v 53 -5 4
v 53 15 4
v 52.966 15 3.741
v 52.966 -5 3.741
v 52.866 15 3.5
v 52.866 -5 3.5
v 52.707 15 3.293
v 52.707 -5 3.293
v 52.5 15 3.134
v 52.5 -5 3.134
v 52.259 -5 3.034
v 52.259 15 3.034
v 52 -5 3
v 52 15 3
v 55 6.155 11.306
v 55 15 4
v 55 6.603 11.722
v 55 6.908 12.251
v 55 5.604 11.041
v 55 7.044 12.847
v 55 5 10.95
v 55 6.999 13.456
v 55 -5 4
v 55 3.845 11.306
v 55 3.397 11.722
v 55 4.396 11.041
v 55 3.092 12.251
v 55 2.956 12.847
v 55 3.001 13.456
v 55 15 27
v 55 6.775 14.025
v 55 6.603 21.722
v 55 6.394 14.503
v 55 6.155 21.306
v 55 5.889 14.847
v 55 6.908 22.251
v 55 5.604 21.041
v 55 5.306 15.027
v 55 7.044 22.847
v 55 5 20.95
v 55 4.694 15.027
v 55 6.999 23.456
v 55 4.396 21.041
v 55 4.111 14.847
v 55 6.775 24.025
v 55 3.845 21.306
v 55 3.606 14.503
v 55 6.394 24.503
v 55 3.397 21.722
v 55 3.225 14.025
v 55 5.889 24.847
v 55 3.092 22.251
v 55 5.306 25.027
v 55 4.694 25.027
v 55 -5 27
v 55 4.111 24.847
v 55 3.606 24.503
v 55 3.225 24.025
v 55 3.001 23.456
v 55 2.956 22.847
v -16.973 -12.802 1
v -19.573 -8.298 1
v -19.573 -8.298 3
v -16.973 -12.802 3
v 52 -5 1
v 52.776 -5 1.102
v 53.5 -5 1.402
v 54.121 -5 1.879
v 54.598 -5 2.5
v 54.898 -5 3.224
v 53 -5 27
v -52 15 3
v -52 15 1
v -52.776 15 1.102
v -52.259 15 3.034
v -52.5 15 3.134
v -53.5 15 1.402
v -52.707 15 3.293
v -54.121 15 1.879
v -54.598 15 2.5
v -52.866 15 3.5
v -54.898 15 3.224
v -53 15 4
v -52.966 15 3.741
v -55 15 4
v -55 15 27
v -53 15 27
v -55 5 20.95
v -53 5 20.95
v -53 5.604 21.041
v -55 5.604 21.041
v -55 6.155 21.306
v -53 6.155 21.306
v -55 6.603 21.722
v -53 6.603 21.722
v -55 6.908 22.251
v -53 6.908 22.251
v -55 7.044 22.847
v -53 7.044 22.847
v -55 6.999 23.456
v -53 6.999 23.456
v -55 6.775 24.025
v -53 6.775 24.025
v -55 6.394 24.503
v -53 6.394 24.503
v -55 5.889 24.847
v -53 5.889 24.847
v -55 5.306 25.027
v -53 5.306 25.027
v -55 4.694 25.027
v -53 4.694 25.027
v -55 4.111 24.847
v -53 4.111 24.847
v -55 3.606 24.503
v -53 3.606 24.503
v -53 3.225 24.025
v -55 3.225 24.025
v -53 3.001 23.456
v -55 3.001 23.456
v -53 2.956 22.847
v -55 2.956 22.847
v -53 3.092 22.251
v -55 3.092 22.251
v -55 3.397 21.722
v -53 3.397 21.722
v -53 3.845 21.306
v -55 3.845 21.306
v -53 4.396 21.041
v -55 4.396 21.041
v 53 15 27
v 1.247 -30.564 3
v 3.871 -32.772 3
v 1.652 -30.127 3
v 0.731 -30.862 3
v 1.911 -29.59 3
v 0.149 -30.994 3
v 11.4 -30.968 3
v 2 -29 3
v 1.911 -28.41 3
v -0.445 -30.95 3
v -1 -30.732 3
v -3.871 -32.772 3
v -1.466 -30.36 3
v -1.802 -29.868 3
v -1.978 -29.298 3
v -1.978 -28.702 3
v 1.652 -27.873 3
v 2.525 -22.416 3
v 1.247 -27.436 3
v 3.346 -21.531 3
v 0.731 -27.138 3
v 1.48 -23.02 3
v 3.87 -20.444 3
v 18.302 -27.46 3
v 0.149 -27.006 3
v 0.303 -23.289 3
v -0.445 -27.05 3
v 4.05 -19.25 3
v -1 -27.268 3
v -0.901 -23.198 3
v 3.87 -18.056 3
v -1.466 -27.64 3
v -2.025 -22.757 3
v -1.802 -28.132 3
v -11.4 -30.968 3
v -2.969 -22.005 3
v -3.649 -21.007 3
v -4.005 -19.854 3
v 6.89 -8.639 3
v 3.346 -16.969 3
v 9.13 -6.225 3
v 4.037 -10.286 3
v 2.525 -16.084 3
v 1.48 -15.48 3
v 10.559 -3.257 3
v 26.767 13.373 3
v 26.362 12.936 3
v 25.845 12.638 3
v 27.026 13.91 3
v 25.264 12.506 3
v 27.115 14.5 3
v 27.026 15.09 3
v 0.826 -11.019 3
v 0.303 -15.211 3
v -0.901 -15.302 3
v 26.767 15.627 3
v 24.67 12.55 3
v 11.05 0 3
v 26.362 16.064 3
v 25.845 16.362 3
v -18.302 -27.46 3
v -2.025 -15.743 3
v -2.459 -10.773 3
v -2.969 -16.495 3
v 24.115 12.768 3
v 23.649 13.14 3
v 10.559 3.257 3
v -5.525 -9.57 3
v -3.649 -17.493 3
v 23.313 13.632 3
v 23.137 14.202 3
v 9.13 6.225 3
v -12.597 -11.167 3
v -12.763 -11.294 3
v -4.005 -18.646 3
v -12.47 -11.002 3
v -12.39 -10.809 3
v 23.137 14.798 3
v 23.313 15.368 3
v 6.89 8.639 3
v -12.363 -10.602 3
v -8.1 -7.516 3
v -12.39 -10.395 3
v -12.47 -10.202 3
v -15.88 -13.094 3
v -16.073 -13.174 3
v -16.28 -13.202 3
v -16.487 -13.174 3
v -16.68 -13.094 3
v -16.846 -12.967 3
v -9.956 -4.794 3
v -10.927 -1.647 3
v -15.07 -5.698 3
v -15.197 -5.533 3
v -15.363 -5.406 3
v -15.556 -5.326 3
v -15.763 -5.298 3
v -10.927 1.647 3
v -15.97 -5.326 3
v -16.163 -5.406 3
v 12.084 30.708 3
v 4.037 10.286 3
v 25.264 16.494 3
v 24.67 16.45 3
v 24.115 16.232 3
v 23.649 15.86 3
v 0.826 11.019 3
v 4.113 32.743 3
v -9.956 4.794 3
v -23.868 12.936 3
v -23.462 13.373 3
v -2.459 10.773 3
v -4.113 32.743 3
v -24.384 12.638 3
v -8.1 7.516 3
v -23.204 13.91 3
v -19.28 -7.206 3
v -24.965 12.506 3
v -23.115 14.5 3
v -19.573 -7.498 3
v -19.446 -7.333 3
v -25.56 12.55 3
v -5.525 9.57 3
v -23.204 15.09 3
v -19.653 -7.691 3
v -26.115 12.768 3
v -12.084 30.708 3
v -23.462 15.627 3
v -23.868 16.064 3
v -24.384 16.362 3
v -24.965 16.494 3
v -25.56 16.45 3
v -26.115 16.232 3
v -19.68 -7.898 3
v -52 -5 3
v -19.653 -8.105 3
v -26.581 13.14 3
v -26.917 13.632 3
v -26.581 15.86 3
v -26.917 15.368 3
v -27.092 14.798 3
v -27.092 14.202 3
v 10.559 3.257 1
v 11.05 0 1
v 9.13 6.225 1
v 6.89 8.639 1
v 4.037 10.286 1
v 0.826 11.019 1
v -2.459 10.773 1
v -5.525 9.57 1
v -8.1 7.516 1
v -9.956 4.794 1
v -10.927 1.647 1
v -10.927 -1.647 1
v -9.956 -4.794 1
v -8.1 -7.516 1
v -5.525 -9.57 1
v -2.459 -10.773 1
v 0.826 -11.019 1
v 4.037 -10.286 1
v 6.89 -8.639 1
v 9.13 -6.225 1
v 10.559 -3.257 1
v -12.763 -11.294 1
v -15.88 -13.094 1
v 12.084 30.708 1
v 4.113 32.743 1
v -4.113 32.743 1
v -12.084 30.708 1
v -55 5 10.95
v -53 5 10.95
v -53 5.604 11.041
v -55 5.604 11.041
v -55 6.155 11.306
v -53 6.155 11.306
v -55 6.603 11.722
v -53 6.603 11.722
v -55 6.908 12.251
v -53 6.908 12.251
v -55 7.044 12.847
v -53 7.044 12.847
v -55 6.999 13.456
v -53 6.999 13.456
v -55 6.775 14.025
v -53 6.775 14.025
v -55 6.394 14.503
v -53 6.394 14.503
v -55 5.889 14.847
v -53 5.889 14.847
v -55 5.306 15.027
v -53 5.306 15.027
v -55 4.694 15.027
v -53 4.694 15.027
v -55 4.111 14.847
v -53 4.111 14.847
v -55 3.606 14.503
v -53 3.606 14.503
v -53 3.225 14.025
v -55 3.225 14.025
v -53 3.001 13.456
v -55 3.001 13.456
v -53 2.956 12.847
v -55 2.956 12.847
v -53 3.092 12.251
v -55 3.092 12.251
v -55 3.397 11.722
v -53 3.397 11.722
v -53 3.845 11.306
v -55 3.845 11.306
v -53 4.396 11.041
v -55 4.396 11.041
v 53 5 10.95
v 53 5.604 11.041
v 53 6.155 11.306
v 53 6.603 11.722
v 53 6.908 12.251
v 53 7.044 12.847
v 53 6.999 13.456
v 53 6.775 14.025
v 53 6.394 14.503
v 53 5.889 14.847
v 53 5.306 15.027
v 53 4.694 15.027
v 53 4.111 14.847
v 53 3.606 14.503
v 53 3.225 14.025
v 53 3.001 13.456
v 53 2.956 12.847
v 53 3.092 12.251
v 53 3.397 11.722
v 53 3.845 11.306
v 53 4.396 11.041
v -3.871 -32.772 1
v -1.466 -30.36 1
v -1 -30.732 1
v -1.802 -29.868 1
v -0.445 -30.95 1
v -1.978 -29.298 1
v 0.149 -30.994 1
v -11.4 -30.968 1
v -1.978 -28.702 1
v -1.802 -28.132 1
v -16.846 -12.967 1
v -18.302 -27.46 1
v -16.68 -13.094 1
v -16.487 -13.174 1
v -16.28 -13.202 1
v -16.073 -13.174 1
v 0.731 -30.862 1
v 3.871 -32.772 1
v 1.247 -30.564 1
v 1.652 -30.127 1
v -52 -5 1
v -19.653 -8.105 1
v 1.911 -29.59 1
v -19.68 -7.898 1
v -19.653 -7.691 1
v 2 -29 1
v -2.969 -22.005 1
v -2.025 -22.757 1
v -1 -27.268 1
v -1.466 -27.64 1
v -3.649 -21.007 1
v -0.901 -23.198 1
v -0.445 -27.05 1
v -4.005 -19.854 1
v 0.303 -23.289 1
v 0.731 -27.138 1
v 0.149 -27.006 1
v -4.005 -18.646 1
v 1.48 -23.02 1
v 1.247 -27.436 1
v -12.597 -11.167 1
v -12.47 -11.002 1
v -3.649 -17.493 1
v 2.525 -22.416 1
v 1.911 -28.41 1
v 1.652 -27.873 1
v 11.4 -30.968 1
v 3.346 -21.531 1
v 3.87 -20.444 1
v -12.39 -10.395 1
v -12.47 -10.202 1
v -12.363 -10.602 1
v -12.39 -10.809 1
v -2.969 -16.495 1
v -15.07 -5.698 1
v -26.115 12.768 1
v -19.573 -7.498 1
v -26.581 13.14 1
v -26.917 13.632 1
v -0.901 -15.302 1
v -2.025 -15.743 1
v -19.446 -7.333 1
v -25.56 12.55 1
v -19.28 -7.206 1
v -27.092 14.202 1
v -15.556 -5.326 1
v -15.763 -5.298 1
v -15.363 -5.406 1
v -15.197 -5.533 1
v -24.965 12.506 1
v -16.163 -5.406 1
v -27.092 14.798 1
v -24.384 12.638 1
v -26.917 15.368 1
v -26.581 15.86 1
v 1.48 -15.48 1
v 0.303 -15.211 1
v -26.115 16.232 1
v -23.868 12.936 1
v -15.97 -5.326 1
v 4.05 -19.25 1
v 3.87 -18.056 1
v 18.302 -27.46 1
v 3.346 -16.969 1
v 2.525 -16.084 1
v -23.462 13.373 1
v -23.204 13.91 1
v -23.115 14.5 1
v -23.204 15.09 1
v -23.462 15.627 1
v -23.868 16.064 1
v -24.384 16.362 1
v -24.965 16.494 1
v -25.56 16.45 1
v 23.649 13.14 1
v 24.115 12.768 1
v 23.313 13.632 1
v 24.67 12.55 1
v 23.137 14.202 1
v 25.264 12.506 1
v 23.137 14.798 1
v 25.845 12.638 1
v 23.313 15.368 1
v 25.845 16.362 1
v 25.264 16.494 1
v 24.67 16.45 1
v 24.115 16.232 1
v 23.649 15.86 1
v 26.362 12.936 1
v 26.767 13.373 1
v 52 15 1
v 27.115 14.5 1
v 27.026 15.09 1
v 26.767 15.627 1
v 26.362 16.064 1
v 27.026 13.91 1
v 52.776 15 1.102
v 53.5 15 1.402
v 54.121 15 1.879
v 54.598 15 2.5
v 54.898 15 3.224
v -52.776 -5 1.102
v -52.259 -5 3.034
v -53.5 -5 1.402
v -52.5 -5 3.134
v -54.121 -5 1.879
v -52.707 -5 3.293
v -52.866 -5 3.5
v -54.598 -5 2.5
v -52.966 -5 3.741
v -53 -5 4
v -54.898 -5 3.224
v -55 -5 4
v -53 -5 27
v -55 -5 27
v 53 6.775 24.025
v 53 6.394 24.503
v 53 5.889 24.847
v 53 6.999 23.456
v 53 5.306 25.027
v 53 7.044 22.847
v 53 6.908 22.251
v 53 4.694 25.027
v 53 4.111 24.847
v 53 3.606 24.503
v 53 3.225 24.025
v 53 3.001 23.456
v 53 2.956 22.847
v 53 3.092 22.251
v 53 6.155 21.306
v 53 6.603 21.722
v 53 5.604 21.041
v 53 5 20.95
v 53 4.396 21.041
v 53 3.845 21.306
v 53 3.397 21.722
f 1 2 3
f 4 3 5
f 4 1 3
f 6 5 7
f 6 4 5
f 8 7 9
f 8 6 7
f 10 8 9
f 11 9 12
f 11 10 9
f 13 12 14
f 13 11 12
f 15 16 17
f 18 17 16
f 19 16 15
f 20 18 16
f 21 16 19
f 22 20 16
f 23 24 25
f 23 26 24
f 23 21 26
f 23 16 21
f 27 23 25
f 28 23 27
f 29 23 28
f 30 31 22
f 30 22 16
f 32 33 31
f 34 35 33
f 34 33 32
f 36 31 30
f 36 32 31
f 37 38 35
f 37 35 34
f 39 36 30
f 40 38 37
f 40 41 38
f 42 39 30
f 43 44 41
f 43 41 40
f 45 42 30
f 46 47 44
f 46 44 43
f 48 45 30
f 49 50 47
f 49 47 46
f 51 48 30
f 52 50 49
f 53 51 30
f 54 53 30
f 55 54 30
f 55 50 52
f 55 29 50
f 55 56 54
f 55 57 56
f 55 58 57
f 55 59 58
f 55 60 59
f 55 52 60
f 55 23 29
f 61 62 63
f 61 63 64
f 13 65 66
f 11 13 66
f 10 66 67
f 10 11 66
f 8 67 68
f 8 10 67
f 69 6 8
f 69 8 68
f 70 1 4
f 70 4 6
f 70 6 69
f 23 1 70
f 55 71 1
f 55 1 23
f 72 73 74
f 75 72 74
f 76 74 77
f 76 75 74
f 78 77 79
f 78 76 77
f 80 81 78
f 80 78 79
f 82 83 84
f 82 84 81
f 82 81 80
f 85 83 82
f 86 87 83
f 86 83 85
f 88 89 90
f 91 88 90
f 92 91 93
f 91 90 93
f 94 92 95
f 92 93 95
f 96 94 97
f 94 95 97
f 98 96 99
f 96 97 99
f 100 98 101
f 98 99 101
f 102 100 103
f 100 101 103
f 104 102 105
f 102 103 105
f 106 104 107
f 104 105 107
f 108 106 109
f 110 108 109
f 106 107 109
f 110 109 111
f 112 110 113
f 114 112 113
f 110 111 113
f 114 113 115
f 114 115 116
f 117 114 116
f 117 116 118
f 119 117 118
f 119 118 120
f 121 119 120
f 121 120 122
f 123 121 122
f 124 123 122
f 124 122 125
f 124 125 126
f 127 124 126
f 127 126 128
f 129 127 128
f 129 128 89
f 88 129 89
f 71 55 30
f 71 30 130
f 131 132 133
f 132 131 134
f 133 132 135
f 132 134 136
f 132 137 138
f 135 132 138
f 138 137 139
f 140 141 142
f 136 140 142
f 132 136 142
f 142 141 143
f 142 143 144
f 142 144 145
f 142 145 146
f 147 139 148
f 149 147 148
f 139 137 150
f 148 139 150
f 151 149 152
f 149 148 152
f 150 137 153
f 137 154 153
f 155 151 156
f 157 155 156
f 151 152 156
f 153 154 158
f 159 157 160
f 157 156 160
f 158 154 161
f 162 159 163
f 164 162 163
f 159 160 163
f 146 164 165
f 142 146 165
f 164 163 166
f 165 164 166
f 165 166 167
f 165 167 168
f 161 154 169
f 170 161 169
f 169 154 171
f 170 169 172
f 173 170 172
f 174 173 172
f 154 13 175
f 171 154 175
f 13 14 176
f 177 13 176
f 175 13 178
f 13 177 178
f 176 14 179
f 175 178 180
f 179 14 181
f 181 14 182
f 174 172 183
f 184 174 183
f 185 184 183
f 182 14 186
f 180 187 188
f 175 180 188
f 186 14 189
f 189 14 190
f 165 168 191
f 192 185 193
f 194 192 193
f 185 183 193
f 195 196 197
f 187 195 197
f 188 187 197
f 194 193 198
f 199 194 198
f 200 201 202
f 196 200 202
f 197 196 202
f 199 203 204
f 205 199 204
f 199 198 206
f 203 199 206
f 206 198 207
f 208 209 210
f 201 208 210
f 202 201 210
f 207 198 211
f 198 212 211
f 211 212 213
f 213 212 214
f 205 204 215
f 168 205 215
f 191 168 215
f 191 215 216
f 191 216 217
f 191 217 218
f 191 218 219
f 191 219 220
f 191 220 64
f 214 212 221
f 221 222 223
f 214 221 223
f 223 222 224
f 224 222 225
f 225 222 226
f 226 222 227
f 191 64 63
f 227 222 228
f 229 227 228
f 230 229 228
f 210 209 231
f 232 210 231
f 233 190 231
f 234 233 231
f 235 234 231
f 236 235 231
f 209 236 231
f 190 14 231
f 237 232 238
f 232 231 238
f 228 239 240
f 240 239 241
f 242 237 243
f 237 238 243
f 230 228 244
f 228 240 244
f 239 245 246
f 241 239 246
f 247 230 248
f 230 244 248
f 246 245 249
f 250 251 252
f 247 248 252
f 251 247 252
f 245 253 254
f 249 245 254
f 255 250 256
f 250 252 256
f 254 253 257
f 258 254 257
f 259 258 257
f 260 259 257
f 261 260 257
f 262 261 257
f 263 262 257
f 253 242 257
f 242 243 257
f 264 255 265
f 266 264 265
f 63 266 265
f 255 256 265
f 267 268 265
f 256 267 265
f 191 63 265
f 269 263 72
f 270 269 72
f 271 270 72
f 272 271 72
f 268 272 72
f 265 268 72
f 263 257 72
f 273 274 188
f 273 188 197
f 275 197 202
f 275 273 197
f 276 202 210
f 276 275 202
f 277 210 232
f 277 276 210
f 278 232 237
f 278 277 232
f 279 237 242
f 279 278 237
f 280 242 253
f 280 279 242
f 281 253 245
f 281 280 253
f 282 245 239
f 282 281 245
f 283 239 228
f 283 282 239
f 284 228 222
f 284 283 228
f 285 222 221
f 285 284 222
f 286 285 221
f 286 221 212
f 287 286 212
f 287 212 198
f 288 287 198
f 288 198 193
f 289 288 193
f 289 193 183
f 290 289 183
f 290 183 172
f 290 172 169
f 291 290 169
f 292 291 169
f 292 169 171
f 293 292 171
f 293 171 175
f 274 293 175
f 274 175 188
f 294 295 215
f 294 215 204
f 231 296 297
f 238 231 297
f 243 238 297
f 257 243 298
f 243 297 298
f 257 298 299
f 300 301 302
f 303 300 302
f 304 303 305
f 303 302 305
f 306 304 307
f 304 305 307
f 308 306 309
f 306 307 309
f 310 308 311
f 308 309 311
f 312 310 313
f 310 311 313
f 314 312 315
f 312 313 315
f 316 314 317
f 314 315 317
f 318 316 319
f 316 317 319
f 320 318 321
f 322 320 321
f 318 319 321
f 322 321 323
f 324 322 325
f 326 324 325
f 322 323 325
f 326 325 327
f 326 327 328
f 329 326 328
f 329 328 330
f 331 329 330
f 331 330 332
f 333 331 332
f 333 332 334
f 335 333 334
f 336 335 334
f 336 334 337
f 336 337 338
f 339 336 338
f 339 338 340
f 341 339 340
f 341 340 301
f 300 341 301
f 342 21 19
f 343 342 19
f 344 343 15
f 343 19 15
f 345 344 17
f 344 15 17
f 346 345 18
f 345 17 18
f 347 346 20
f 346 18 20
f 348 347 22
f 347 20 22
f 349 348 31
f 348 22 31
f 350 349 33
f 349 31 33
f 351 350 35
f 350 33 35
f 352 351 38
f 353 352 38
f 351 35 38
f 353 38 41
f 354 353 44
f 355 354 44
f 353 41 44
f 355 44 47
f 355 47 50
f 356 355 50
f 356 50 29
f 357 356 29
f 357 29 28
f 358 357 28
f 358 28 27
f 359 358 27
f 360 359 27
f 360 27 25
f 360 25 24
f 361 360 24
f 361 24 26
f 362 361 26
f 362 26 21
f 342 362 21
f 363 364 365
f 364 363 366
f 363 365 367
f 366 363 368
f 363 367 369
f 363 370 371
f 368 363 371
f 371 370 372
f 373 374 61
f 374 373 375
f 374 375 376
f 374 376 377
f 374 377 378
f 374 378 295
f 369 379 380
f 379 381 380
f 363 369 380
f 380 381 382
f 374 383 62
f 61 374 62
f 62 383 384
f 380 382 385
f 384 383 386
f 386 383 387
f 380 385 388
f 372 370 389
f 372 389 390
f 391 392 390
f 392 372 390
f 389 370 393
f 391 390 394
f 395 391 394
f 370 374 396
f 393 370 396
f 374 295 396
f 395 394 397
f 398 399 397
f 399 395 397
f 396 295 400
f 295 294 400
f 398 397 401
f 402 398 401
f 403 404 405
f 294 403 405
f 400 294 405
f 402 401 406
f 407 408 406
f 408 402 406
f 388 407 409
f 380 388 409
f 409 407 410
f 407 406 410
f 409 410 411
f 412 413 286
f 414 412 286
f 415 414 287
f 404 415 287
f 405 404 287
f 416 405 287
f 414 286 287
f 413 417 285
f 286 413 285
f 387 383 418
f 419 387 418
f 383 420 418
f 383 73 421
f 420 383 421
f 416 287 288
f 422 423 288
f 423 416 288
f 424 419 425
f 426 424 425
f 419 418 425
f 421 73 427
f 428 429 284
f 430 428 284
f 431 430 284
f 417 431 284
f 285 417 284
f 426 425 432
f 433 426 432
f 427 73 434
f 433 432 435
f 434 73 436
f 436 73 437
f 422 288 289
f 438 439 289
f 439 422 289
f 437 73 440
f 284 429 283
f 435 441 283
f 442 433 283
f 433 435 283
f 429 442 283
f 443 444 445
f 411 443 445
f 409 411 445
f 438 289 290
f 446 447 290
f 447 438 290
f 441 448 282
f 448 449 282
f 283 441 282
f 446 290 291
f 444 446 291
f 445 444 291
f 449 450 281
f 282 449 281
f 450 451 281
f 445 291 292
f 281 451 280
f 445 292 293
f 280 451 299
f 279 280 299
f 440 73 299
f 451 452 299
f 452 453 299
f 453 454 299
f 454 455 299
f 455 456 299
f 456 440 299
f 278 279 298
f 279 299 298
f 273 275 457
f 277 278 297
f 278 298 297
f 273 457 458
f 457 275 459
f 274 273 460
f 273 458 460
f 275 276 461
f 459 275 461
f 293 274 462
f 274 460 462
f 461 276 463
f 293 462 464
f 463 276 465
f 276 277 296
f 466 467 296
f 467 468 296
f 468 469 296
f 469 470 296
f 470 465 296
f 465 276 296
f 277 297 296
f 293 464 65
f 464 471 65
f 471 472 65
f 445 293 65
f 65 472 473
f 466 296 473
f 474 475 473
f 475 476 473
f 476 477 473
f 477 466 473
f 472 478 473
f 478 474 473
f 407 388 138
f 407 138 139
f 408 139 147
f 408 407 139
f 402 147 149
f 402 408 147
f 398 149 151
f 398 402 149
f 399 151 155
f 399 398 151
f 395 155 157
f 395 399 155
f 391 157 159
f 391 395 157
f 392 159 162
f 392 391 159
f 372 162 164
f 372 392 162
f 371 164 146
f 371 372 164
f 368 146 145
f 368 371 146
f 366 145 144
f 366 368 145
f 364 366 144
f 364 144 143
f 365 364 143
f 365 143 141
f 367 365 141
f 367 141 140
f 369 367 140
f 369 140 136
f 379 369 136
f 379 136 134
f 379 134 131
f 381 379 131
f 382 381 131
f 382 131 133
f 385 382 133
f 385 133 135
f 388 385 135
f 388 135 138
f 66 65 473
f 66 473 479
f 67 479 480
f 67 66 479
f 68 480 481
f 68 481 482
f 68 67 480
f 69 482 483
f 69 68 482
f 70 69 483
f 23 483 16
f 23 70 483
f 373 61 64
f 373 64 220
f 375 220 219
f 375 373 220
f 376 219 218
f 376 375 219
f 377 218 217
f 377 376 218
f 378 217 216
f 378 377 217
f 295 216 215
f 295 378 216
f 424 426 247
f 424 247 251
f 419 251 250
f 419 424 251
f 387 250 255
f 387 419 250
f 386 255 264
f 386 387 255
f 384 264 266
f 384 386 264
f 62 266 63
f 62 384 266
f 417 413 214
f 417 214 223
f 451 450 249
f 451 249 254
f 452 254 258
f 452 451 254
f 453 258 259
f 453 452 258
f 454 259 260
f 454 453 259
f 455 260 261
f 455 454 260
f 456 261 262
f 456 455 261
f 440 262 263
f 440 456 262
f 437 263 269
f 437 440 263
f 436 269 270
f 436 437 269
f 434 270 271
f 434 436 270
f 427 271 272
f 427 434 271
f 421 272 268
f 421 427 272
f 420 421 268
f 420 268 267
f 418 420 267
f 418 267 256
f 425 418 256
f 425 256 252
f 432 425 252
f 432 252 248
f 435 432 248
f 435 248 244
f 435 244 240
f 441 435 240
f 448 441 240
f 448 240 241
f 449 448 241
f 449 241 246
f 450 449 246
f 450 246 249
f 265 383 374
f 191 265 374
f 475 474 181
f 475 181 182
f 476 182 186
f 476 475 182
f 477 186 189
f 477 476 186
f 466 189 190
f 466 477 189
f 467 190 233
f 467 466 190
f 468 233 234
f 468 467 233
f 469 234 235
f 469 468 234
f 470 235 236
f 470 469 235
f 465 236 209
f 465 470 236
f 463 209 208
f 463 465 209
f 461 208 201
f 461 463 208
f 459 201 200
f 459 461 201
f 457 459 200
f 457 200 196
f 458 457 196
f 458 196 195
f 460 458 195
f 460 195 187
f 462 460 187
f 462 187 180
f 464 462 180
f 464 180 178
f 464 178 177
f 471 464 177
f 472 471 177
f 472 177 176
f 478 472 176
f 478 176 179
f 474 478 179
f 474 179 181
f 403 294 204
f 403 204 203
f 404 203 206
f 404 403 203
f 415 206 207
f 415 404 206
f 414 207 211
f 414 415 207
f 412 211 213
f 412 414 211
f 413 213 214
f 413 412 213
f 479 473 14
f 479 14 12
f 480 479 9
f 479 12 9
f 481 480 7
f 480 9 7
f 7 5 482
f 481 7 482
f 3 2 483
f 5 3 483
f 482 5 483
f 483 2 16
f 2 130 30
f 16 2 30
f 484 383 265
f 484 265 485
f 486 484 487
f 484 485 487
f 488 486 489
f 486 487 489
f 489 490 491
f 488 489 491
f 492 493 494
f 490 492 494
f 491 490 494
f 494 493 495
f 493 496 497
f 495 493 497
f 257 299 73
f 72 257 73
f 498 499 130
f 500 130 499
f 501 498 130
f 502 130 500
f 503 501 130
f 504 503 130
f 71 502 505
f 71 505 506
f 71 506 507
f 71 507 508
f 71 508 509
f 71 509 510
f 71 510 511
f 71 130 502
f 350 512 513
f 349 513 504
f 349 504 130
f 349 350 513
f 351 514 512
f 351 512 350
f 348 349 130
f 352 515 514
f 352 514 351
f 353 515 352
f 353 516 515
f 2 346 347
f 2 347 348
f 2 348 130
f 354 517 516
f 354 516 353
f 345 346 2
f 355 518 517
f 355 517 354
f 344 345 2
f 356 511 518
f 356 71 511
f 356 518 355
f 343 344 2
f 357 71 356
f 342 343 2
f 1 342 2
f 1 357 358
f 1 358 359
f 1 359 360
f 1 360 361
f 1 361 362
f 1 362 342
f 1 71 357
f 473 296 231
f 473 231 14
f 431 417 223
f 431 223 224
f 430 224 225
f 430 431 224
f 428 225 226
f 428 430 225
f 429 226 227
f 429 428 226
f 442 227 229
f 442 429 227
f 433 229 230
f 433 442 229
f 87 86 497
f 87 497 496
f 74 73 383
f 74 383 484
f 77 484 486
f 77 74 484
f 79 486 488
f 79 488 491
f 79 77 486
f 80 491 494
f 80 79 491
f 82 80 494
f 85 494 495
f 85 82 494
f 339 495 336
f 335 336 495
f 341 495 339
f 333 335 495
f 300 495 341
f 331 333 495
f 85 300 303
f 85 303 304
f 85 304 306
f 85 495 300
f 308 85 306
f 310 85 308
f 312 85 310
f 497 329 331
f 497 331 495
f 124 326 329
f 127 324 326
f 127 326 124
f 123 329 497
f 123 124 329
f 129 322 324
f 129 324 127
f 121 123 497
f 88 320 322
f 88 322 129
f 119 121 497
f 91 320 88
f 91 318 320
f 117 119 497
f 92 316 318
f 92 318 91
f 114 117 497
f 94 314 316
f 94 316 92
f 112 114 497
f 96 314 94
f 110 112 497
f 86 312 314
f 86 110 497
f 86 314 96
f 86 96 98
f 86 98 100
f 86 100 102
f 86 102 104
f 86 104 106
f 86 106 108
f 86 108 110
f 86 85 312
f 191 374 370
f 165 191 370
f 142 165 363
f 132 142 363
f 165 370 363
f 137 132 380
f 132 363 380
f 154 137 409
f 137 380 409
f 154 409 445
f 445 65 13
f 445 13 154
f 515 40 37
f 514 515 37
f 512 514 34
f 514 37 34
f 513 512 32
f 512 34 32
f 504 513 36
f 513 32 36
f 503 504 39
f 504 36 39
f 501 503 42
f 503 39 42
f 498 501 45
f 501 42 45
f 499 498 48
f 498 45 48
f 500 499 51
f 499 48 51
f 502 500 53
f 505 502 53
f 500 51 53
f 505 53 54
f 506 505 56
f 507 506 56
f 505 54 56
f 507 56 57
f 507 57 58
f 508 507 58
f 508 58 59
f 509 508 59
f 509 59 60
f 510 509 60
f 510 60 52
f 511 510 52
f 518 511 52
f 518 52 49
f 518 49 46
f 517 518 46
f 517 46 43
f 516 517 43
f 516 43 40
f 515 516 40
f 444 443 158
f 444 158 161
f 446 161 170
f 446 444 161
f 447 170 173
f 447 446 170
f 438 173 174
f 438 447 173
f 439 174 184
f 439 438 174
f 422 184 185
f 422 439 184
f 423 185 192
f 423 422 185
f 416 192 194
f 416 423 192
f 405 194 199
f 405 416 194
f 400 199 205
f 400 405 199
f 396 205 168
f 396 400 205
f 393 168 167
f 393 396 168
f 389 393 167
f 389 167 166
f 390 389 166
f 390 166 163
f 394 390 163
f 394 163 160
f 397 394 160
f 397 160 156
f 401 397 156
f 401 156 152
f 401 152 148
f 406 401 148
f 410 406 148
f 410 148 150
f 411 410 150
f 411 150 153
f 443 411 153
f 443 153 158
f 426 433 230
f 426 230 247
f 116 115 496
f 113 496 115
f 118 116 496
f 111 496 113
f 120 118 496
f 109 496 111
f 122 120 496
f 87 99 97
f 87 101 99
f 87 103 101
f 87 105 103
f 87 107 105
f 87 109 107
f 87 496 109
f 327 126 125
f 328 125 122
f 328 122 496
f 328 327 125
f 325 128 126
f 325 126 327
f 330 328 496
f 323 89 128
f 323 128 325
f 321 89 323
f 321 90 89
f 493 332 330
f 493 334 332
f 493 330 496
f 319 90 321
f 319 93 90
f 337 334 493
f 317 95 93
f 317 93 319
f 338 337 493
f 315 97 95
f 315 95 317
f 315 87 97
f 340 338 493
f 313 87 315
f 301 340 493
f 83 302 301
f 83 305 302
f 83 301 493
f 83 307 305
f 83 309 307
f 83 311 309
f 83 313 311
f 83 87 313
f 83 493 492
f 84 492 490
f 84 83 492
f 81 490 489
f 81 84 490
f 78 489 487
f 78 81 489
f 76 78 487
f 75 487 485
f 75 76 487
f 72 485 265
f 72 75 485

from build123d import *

# Parameters (mm, degrees)
SKETCH_1_R                  = 33
SKETCH_1_R_2                = 11.05
SKETCH_1_R_3                = 4.05
SKETCH_1_R_4                = 2
EXTRUDE_1_DEPTH             = 3
EXTRUDE_2_DEPTH             = 3
SHEET_METAL_1_OUTLINE_R     = 2
SHEET_METAL_1_OUTLINE_R_2   = 4.05
SHEET_METAL_1_OUTLINE_R_3   = 11.05
SHEET_METAL_1_DEPTH         = 1
SM_EDGE_FLANGE_1_DEPTH      = 20
SM_EDGE_FLANGE_1_BEND_DEPTH = 20
SKETCH_13_R                 = 2.05
CUT_EXTRUDE_1_DEPTH         = 118.974573532


# Read off the part's stored shape, not the designer's step: 转换实体1
# Sheet-metal steps are written as plain solids
with BuildPart() as part:
    # Sketch 1 → 凸台-拉伸1 (new body)
    with BuildSketch(Plane.XY):
        Circle(SKETCH_1_R)
        Circle(SKETCH_1_R_2, mode=Mode.SUBTRACT)
        with Locations((0, -19.25)):
            Circle(SKETCH_1_R_3, mode=Mode.SUBTRACT)
        with Locations((25.11473671, 14.5)):
            Circle(SKETCH_1_R_4, mode=Mode.SUBTRACT)
        with Locations((0, -29)):
            Circle(SKETCH_1_R_4, mode=Mode.SUBTRACT)
        with Locations((-25.11473671, 14.5)):
            Circle(SKETCH_1_R_4, mode=Mode.SUBTRACT)
        with BuildLine():
            Line((-19.57313602, -8.29833395), (-16.97313602, -12.80166605))
            ThreePointArc((-16.97313602, -12.80166605), (-16.487370933, -13.174406711), (-15.880315697, -13.094486373))
            Line((-15.880315697, -13.094486373), (-12.762624243, -11.294486373))
            ThreePointArc((-12.762624243, -11.294486373), (-12.389883582, -10.808721286), (-12.46980392, -10.20166605))
            Line((-12.46980392, -10.20166605), (-15.06980392, -5.69833395))
            ThreePointArc((-15.06980392, -5.69833395), (-15.555569007, -5.325593289), (-16.162624243, -5.405513627))
            Line((-16.162624243, -5.405513627), (-19.280315697, -7.205513627))
            ThreePointArc((-19.280315697, -7.205513627), (-19.653056358, -7.691278714), (-19.57313602, -8.29833395))
        make_face(mode=Mode.SUBTRACT)
    extrude(amount=EXTRUDE_1_DEPTH)

    # 草图3 → 凸台-拉伸2 (add)
    with BuildSketch(Plane.XY):
        with BuildLine():
            ThreePointArc((-18.301945503, -27.459766765), (-32.813072233, 3.507462139), (-12.084283208, 30.707818212))
            Line((-12.084283208, 30.707818212), (-52, 15))
            Line((-52, 15), (-52, -5))
            Line((-52, -5), (-18.301945503, -27.459766765))
        make_face()
        with BuildLine():
            ThreePointArc((18.301945503, -27.459766765), (32.813072233, 3.507462139), (12.084283208, 30.707818212))
            Line((12.084283208, 30.707818212), (52, 15))
            Line((52, 15), (52, -5))
            Line((52, -5), (18.301945503, -27.459766765))
        make_face()
    extrude(amount=EXTRUDE_2_DEPTH)

    # Sheet Metal 1 outline → Sheet Metal 1 (cut)
    with BuildSketch(Plane.XY):
        with BuildLine():
            ThreePointArc((-18.301945503, -27.459766765), (0, -33), (18.301945503, -27.459766765))
            Line((18.301945503, -27.459766765), (52, -5))
            Line((52, -5), (52, 15))
            Line((52, 15), (12.084283208, 30.707818212))
            ThreePointArc((12.084283208, 30.707818212), (0, 33), (-12.084283208, 30.707818212))
            Line((-12.084283208, 30.707818212), (-52, 15))
            Line((-52, 15), (-52, -5))
            Line((-52, -5), (-18.301945503, -27.459766765))
        make_face()
        with BuildLine():
            Line((-16.97313602, -12.80166605), (-19.57313602, -8.29833395))
            ThreePointArc((-19.57313602, -8.29833395), (-19.653056358, -7.691278714), (-19.280315697, -7.205513627))
            Line((-19.280315697, -7.205513627), (-16.162624243, -5.405513627))
            ThreePointArc((-16.162624243, -5.405513627), (-15.555569007, -5.325593289), (-15.06980392, -5.69833395))
            Line((-15.06980392, -5.69833395), (-12.46980392, -10.20166605))
            ThreePointArc((-12.46980392, -10.20166605), (-12.389883582, -10.808721286), (-12.762624243, -11.294486373))
            Line((-12.762624243, -11.294486373), (-15.880315697, -13.094486373))
            ThreePointArc((-15.880315697, -13.094486373), (-16.487370933, -13.174406711), (-16.97313602, -12.80166605))
        make_face(mode=Mode.SUBTRACT)
        with Locations((0, -29)):
            Circle(SHEET_METAL_1_OUTLINE_R, mode=Mode.SUBTRACT)
        with Locations((0, -19.25)):
            Circle(SHEET_METAL_1_OUTLINE_R_2, mode=Mode.SUBTRACT)
        with Locations((-25.11473671, 14.5)):
            Circle(SHEET_METAL_1_OUTLINE_R, mode=Mode.SUBTRACT)
        Circle(SHEET_METAL_1_OUTLINE_R_3, mode=Mode.SUBTRACT)
        with Locations((25.11473671, 14.5)):
            Circle(SHEET_METAL_1_OUTLINE_R, mode=Mode.SUBTRACT)
    extrude(amount=SHEET_METAL_1_DEPTH, mode=Mode.SUBTRACT)

    # 边线-法兰1 section (across the edge) → 边线-法兰1 (add)
    with BuildSketch(Plane(origin=(53, -5, 3), x_dir=(-1, 0, 0), z_dir=(0, 1, 0))):
        with BuildLine():
            Line((-2, 1), (-2, 24))
            Line((-2, 24), (0, 24))
            Line((0, 24), (0, 1))
            ThreePointArc((0, 1), (0.292893219, 0.292893219), (1, 0))
            Line((1, 0), (1, -2))
            ThreePointArc((1, -2), (-1.121320344, -1.121320344), (-2, 1))
        make_face()
    extrude(amount=SM_EDGE_FLANGE_1_DEPTH)

    # 边线-法兰1 section 2 (across the edge) → 边线-法兰1 bend (add)
    with BuildSketch(Plane(origin=(-53, 15, 3), x_dir=(1, 0, 0), z_dir=(0, -1, 0))):
        with BuildLine():
            Line((-2, 1), (-2, 24))
            Line((-2, 24), (0, 24))
            Line((0, 24), (0, 1))
            ThreePointArc((0, 1), (0.292893219, 0.292893219), (1, 0))
            Line((1, 0), (1, -2))
            ThreePointArc((1, -2), (-1.121320344, -1.121320344), (-2, 1))
        make_face()
    extrude(amount=SM_EDGE_FLANGE_1_BEND_DEPTH)

    # 草图13 → 切除-拉伸1 (cut, through all)
    with BuildSketch(Plane(origin=(55, 0, 0), x_dir=(0, 0, -1), z_dir=(1, 0, 0))):
        with Locations((-23, 5)):
            Circle(SKETCH_13_R)
        with Locations((-13, 5)):
            Circle(SKETCH_13_R)
    extrude(amount=-CUT_EXTRUDE_1_DEPTH, mode=Mode.SUBTRACT)


solid = part.part
